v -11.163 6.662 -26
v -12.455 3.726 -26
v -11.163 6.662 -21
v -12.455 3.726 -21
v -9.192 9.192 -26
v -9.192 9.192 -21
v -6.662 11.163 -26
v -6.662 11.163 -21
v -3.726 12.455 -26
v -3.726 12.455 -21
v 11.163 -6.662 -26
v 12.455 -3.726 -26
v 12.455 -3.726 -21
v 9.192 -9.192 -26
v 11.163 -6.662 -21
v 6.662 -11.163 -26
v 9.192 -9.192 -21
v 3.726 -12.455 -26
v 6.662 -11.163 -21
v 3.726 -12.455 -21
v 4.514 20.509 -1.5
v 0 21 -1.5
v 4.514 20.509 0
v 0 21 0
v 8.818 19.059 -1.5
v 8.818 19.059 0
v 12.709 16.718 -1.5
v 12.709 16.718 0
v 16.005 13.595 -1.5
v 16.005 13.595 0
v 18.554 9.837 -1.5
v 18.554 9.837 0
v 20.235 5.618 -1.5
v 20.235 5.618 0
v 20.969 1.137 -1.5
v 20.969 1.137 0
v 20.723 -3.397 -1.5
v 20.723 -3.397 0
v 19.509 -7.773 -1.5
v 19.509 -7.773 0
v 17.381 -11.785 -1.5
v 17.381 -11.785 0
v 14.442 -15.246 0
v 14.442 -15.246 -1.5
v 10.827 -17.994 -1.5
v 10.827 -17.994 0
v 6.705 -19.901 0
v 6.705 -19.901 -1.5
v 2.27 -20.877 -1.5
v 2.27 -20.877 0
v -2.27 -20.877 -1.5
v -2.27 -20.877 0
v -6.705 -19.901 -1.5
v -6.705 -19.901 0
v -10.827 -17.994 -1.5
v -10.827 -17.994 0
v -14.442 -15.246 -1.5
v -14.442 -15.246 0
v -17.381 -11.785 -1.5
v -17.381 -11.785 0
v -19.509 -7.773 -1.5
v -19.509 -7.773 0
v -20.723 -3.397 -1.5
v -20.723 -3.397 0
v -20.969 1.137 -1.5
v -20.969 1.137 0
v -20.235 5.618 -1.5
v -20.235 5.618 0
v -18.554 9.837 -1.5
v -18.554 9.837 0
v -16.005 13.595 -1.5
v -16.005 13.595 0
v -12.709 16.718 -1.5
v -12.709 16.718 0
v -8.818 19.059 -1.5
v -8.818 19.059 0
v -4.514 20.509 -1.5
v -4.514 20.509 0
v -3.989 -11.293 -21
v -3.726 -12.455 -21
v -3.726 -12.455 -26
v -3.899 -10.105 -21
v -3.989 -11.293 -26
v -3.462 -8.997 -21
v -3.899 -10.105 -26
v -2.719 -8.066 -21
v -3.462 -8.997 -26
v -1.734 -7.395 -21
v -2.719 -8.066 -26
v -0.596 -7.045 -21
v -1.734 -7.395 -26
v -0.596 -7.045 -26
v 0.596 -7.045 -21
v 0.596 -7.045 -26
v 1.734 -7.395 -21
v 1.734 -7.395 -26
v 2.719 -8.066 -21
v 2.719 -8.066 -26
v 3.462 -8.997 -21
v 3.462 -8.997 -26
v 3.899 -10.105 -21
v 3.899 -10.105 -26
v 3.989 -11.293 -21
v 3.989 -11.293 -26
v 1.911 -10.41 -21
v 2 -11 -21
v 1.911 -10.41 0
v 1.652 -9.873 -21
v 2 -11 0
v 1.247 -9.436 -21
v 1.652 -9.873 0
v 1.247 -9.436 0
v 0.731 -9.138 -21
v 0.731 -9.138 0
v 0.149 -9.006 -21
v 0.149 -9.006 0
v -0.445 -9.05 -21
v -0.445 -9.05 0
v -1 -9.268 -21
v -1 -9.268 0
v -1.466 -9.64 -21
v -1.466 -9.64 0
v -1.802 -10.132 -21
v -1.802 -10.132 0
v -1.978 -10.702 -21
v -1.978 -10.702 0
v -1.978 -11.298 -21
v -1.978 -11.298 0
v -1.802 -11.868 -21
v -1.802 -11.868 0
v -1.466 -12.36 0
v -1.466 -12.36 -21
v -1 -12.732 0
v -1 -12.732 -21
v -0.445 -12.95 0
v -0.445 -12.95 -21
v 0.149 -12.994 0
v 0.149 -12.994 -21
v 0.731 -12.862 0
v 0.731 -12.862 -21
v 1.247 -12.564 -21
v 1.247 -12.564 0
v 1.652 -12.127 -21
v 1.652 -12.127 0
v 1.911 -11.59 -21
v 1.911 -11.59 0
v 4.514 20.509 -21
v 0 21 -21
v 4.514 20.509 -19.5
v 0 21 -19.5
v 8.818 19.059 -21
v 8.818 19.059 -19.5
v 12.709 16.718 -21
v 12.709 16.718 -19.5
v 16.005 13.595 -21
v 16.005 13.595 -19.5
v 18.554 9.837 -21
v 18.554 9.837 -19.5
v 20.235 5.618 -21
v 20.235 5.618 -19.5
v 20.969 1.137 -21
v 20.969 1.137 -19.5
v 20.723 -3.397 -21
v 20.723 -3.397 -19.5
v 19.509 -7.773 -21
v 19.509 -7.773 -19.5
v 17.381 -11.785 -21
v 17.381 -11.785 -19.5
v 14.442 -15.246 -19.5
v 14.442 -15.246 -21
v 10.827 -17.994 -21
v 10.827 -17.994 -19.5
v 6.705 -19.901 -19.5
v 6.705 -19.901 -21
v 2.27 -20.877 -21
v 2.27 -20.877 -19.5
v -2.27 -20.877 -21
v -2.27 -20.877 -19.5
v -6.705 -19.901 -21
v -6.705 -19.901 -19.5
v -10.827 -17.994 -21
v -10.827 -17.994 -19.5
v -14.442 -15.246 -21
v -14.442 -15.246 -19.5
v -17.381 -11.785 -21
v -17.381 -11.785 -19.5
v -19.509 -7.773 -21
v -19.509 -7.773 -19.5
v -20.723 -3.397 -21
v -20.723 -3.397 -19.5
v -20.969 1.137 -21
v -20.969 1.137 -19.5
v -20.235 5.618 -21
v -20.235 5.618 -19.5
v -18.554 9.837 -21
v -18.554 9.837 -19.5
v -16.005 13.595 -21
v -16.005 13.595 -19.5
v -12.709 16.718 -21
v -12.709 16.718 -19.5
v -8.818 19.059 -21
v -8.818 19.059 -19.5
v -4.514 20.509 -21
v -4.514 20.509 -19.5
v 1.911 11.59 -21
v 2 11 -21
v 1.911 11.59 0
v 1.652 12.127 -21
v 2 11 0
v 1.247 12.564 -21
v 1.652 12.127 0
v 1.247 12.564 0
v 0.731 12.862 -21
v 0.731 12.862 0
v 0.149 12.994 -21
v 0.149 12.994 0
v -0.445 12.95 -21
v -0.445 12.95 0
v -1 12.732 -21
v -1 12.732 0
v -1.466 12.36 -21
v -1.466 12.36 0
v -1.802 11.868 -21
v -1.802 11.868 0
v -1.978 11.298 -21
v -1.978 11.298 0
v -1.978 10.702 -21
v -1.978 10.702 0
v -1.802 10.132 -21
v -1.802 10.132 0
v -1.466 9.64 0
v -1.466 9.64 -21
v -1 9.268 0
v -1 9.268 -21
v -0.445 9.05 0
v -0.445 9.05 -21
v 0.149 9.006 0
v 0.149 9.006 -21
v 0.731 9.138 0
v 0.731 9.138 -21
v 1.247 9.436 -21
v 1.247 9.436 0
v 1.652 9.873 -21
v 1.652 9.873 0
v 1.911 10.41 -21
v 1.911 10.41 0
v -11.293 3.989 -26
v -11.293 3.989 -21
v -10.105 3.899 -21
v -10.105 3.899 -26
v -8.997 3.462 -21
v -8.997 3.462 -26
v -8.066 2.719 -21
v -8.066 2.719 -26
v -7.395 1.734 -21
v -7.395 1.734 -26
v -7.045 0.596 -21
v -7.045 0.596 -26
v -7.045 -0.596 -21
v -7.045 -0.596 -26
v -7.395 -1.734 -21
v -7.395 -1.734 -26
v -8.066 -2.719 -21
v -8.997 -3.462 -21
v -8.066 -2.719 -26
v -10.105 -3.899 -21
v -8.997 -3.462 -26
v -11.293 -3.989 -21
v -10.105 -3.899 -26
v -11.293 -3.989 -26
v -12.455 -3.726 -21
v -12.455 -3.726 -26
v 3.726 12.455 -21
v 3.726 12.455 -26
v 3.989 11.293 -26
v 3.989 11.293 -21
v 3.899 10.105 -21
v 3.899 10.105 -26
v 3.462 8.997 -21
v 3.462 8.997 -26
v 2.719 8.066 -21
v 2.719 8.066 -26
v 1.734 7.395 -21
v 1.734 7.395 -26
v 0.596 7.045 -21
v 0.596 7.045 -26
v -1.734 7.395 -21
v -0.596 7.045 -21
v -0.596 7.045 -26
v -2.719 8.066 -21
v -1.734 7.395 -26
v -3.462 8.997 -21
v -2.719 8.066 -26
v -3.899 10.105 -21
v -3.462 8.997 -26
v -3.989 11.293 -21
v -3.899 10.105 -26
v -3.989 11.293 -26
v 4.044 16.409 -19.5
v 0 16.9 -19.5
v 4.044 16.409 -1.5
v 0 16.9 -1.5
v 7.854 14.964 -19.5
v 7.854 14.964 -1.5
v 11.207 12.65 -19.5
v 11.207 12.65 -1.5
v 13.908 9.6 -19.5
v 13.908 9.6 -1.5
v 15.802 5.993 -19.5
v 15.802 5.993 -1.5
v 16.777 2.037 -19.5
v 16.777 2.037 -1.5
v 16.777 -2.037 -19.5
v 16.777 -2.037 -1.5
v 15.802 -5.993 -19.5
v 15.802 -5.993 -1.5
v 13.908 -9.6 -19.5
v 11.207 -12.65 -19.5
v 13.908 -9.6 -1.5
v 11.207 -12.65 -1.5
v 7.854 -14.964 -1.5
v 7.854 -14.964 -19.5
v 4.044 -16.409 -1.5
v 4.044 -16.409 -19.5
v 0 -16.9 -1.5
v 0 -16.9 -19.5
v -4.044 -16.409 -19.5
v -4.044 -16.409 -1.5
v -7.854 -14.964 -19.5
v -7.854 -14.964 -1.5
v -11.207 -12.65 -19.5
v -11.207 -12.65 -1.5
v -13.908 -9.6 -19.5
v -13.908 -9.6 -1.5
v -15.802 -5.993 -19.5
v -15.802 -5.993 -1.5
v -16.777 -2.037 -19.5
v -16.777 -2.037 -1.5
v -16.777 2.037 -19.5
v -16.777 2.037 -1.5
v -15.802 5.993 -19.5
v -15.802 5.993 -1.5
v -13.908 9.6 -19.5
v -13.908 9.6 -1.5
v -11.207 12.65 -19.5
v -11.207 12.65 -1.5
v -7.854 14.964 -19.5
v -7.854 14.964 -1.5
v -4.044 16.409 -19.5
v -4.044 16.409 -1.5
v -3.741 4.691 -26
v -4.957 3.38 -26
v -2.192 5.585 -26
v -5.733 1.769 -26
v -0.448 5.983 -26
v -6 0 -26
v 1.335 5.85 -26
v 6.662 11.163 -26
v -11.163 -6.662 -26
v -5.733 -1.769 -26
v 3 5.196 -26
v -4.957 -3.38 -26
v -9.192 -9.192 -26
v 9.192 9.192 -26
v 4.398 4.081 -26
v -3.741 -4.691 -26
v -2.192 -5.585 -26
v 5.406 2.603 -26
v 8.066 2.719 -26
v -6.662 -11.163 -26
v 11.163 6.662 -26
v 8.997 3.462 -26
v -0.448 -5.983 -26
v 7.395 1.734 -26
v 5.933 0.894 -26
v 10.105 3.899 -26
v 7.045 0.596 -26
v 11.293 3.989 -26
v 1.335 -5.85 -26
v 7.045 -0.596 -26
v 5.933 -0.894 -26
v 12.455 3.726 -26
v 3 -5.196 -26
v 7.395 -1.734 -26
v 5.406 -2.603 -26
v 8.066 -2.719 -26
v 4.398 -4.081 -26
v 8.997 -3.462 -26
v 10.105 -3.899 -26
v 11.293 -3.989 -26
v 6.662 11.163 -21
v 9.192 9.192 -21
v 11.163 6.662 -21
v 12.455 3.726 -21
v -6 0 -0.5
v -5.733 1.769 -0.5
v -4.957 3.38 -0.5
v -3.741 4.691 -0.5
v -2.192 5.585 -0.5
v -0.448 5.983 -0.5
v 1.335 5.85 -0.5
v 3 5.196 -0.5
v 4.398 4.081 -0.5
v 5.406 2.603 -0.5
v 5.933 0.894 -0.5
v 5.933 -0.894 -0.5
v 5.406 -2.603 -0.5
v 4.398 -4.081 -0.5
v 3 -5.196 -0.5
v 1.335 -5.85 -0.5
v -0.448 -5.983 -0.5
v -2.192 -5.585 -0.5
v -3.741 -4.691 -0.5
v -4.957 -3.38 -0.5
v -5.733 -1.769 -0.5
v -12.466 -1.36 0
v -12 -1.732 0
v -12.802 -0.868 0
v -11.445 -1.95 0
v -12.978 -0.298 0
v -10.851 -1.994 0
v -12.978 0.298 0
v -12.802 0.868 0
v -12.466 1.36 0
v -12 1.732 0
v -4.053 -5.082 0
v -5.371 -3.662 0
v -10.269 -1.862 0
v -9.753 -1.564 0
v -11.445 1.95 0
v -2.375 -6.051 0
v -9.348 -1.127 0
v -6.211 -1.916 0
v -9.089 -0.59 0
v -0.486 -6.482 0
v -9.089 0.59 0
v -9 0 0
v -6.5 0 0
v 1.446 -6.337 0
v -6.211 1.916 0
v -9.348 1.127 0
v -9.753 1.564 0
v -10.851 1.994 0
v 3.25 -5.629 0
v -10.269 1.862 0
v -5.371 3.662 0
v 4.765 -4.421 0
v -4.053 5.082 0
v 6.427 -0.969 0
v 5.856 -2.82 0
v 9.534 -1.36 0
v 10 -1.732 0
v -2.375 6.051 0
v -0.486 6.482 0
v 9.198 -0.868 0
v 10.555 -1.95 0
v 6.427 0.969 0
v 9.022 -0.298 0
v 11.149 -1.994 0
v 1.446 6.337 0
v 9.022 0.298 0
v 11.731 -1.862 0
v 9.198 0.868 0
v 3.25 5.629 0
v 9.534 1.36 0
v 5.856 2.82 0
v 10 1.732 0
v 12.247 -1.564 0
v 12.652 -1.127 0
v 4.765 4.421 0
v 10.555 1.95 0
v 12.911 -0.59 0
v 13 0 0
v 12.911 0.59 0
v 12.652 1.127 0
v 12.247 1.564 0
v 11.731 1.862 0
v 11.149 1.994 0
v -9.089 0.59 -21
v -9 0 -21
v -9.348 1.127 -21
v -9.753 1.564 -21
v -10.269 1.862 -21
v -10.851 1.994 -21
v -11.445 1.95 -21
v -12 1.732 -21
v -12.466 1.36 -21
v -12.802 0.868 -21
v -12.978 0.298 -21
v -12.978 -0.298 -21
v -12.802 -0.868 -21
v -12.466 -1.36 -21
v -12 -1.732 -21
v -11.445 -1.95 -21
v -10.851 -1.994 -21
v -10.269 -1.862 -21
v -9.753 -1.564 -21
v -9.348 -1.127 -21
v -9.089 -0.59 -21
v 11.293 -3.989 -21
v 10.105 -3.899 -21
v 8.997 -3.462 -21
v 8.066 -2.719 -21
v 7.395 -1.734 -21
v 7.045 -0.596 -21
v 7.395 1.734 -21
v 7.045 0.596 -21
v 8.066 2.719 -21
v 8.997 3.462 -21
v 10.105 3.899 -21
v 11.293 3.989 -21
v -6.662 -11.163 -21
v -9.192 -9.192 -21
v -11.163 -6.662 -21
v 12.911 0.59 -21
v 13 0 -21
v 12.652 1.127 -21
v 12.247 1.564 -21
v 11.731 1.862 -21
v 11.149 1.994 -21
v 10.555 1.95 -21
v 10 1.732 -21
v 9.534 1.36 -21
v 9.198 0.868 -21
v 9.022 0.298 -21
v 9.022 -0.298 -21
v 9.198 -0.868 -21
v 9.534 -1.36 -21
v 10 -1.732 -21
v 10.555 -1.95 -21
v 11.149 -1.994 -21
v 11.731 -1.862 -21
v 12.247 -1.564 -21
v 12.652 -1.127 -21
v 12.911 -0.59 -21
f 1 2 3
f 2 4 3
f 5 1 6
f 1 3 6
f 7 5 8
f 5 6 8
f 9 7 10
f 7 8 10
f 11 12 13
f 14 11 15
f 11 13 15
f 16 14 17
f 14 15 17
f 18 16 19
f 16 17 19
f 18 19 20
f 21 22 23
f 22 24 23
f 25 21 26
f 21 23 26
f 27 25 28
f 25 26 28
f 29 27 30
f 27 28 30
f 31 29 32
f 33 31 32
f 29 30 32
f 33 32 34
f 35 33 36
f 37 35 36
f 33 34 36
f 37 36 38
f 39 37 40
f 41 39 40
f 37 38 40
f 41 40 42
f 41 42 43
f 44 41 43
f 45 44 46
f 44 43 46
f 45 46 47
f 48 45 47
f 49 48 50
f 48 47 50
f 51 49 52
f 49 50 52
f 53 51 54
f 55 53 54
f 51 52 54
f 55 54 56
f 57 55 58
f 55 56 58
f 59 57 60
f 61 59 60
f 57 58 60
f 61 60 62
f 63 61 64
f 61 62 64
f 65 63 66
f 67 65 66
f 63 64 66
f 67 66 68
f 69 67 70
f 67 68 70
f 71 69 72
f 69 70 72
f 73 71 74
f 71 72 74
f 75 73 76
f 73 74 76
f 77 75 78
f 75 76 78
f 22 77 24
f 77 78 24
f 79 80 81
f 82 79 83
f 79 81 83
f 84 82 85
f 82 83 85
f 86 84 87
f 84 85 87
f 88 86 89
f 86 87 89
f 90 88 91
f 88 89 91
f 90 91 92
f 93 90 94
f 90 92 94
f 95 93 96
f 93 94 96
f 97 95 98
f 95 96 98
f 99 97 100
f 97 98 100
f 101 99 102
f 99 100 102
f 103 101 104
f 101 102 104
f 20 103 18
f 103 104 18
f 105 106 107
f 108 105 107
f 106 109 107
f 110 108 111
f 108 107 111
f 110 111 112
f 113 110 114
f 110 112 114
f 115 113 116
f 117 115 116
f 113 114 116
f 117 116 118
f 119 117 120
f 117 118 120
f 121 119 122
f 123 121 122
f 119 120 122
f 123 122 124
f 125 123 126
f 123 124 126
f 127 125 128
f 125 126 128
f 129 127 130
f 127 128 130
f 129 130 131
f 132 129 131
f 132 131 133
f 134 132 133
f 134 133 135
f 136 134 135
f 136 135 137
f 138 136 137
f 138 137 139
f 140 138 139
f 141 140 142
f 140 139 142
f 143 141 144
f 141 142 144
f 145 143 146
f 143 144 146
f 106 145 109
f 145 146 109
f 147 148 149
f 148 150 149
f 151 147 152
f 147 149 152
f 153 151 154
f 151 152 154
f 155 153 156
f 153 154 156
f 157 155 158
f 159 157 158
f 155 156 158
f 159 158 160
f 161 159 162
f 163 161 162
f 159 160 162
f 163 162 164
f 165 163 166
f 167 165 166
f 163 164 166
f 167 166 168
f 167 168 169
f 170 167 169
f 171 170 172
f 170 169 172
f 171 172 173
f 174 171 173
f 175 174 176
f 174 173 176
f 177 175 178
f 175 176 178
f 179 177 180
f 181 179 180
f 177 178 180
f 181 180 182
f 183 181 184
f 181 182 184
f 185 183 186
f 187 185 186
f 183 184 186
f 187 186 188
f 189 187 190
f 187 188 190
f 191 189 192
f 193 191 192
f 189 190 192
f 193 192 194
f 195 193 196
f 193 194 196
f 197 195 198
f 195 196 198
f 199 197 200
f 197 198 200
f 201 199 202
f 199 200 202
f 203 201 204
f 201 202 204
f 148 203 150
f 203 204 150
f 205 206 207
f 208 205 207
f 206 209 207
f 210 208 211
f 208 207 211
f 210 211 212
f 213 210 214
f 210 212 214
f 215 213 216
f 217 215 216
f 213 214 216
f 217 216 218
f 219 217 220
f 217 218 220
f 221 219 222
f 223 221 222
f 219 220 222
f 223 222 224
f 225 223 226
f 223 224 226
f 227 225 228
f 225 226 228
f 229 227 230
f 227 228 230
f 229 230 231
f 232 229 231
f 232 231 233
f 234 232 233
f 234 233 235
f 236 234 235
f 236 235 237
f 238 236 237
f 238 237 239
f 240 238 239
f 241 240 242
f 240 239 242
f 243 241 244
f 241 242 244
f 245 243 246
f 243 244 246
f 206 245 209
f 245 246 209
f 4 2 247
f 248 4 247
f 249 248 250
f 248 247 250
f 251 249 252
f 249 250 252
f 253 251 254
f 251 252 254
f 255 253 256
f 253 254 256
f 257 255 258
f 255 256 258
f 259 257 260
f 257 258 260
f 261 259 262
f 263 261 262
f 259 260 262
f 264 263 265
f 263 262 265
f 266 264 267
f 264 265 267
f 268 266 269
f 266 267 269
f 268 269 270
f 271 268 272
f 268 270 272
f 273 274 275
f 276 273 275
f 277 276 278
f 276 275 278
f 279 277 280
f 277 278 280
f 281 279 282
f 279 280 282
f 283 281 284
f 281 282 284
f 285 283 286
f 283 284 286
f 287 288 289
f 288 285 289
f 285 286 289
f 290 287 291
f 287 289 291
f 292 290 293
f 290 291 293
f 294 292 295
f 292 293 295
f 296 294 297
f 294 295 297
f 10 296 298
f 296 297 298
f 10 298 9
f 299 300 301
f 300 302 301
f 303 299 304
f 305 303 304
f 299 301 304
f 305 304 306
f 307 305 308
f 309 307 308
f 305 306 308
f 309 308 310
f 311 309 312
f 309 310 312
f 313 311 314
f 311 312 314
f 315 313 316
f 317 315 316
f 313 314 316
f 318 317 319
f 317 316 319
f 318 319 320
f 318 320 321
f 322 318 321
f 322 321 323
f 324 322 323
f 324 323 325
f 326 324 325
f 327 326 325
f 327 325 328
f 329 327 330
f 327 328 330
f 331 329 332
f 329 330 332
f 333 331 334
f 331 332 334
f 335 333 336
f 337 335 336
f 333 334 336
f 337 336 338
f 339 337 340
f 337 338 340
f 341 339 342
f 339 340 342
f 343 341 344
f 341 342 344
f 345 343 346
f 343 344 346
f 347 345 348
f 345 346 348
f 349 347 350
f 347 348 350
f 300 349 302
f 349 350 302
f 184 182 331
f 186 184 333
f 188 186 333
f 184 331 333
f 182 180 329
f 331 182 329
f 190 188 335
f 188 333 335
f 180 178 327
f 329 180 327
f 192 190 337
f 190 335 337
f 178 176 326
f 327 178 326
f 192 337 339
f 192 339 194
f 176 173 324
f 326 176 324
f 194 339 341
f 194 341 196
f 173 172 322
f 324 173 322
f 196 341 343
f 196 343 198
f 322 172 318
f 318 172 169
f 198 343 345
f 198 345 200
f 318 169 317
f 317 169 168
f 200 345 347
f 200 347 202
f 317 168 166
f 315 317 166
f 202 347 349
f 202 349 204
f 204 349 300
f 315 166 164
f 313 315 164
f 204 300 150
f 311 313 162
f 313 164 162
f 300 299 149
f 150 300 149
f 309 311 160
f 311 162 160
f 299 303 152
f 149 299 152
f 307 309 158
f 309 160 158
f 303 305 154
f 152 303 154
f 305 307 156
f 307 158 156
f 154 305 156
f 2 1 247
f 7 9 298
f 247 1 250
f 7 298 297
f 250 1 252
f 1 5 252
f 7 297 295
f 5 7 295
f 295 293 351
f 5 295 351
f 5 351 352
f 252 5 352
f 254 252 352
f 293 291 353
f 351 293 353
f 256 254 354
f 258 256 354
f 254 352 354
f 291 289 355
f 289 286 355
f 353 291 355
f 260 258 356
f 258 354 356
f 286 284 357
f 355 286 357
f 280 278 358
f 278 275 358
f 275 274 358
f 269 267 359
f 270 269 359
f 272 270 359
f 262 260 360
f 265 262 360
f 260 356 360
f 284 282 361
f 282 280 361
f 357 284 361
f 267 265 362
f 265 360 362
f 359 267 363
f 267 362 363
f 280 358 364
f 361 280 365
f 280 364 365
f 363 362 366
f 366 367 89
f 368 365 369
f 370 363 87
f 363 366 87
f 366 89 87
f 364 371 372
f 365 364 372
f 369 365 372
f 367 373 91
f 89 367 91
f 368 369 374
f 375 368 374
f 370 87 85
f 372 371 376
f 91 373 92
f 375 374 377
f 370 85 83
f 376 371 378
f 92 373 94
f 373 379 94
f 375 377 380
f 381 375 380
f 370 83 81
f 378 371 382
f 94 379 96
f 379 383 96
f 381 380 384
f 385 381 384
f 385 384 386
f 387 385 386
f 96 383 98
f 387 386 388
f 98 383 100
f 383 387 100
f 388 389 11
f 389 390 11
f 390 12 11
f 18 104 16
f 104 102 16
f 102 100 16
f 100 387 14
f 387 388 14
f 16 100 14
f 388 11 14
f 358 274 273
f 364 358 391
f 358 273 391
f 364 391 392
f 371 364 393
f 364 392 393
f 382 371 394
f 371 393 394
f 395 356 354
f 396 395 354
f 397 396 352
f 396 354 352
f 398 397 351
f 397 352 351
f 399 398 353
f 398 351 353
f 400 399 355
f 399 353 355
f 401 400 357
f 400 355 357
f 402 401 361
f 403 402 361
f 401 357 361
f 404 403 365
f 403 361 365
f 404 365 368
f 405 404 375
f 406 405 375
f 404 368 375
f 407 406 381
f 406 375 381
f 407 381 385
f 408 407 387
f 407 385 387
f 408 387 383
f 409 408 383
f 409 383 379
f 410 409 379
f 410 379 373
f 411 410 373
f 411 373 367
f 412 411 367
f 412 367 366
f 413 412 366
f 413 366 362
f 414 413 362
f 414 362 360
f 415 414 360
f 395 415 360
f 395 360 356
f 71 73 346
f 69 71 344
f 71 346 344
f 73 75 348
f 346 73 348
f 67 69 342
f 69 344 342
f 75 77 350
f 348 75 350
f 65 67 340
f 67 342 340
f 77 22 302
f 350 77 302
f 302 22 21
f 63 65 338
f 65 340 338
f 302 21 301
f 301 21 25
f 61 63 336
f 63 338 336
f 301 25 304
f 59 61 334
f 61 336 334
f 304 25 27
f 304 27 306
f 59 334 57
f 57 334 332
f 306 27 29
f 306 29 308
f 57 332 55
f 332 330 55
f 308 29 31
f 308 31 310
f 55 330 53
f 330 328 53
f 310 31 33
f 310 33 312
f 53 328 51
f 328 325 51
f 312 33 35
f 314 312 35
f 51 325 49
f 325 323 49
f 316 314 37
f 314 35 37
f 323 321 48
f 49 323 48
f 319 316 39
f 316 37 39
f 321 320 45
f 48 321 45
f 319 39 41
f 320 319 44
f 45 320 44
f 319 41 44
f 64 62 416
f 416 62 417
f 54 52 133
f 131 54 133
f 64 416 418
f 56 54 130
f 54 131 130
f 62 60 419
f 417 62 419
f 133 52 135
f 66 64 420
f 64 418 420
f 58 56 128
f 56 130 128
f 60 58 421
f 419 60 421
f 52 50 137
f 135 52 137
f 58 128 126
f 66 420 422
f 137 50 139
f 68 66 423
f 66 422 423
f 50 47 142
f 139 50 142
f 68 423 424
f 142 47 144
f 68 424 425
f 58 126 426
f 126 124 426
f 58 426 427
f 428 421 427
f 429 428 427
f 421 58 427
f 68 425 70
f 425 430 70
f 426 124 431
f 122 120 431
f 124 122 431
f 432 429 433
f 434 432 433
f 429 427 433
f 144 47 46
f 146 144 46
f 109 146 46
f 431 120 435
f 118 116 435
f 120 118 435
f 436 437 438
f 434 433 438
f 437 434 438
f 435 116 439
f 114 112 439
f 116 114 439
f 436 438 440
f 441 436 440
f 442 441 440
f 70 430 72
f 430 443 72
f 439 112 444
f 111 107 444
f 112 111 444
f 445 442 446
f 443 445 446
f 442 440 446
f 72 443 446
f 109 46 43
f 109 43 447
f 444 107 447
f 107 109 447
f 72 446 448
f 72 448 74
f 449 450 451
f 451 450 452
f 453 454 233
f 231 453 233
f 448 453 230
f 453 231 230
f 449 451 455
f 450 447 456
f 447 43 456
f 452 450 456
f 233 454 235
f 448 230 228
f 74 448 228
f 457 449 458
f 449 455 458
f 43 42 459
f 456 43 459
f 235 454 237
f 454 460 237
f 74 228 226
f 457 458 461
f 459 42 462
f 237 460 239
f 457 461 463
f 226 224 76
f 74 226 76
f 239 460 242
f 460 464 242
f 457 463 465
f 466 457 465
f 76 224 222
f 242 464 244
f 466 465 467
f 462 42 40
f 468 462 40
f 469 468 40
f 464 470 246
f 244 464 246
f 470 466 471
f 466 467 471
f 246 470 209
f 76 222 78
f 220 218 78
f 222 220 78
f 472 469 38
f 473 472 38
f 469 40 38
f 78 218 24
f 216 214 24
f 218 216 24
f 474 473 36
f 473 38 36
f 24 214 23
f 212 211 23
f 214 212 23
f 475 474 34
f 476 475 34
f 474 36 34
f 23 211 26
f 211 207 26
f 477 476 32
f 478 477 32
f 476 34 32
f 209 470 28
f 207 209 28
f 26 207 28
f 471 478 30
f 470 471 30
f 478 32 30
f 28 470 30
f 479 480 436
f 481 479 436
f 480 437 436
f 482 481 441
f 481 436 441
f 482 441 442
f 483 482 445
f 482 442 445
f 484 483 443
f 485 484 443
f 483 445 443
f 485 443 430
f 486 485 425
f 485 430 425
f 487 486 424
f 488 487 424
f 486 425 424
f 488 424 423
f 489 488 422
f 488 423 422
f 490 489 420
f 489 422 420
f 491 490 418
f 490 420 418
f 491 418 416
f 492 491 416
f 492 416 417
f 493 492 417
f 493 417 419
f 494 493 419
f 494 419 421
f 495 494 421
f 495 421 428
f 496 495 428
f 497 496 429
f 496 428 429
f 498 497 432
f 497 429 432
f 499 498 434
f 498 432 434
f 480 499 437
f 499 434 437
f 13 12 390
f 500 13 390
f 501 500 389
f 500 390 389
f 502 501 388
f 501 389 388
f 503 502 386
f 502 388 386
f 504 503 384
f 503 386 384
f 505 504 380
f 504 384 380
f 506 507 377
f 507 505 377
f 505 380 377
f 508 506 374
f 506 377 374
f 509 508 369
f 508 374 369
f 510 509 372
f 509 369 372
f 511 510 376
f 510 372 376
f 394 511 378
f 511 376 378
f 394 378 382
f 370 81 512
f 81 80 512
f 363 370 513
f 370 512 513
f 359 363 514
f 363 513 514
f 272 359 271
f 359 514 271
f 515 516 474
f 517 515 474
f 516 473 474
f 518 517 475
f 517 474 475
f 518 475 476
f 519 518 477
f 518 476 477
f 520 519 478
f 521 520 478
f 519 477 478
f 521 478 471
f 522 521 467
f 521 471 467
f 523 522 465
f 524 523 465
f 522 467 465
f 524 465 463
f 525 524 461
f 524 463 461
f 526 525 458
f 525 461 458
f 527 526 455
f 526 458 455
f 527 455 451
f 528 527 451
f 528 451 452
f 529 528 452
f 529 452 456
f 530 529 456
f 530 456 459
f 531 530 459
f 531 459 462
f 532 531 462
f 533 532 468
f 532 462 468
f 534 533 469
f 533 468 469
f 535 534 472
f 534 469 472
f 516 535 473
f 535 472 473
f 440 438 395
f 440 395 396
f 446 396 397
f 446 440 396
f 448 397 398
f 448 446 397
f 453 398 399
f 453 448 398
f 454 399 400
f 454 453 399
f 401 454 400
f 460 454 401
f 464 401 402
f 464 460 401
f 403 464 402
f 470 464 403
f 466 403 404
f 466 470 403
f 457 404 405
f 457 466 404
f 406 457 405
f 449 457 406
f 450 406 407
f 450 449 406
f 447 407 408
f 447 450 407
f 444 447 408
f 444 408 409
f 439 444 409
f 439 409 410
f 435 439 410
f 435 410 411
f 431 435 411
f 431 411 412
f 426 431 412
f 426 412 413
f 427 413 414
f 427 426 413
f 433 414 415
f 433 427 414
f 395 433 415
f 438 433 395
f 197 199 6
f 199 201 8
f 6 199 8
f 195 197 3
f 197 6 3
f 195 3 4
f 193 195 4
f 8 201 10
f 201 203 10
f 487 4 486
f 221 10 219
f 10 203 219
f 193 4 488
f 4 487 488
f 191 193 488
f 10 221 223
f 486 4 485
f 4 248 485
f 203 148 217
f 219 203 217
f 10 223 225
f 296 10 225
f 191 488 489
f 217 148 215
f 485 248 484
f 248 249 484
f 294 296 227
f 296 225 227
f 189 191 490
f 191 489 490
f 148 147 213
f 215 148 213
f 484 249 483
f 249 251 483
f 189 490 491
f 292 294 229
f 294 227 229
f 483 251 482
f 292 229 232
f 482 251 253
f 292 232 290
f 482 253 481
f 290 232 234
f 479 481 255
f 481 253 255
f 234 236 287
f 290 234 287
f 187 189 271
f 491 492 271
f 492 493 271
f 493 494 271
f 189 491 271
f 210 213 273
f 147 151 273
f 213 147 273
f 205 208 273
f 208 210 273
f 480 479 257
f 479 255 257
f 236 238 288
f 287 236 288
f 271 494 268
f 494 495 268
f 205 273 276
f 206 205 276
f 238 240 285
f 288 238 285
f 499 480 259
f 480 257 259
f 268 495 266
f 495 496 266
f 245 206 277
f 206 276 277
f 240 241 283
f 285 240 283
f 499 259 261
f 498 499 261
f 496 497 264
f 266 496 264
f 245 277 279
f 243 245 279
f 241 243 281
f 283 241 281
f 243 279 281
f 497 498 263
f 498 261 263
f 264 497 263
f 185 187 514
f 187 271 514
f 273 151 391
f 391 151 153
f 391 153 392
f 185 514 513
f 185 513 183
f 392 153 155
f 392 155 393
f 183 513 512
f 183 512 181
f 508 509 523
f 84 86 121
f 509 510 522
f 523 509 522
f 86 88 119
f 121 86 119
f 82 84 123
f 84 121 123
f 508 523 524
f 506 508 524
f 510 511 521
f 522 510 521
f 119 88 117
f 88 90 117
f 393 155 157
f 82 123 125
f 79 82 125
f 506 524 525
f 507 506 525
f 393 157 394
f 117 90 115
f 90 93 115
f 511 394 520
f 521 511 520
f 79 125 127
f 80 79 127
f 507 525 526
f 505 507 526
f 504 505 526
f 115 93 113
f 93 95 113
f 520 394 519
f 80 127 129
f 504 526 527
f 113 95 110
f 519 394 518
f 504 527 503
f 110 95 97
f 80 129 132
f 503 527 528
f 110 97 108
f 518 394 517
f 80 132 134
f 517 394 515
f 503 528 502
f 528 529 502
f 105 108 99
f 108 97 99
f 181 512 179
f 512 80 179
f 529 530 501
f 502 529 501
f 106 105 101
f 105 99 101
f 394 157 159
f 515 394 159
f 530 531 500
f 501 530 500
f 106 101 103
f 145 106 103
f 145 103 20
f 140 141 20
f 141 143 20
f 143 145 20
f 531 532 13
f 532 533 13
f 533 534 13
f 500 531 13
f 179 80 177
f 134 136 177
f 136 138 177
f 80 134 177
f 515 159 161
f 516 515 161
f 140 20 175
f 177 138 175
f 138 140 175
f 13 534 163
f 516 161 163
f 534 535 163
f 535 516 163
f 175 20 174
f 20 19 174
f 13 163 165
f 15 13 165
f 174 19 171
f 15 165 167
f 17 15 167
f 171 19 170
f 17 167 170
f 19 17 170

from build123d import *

# Parameters (mm, degrees)
SKETCH2_R                                           = 6
CUT_EXTRUDE1_DEPTH                                  = 27
CBORE_FOR_M4_HEX_SOCKET_HEAD_CAP_SCREW1_D           = 4
CBORE_FOR_M4_HEX_SOCKET_HEAD_CAP_SCREW1_CBORE_D     = 8
CBORE_FOR_M4_HEX_SOCKET_HEAD_CAP_SCREW1_CBORE_DEPTH = 5
CHAMFER1_SIZE                                       = 0.5


with BuildPart() as part:
    # Sketch1 → Revolve1 (revolve)
    with BuildSketch(Plane(origin=(0, 0, 0), x_dir=(0, 0, -1), z_dir=(1, 0, 0))):
        Polygon((0, 0), (26, 0), (26, 13), (21, 13), (21, 21), (19.5, 21), (19.5, 16.9), (1.5, 16.9), (1.5, 21), (0, 21), align=None)
    revolve(axis=Axis((0, 0, 0), (0, 0, -1)))

    # Sketch2 → Cut-Extrude1 (cut, through all)
    with BuildSketch(Plane(origin=(0, 0, -26), x_dir=(-1, 0, 0), z_dir=(0, 0, -1))):
        Circle(SKETCH2_R)
    extrude(amount=-CUT_EXTRUDE1_DEPTH, mode=Mode.SUBTRACT)

    # CBORE for M4 Hex Socket Head Cap Screw1 (through all)
    with Locations(Plane(origin=(0, 0, -26), x_dir=(-1, 0, 0), z_dir=(0, 0, -1))):
        with Locations((0, 11), (11, 0), (0, -11), (-11, 0)):
            CounterBoreHole(CBORE_FOR_M4_HEX_SOCKET_HEAD_CAP_SCREW1_D / 2, CBORE_FOR_M4_HEX_SOCKET_HEAD_CAP_SCREW1_CBORE_D / 2, CBORE_FOR_M4_HEX_SOCKET_HEAD_CAP_SCREW1_CBORE_DEPTH)

    # Chamfer1
    chamfer1_edges = [part.edges().sort_by_distance(p)[0] for p in [
        (6, 0, 0),
    ]]
    chamfer(chamfer1_edges, length=CHAMFER1_SIZE)


solid = part.part
